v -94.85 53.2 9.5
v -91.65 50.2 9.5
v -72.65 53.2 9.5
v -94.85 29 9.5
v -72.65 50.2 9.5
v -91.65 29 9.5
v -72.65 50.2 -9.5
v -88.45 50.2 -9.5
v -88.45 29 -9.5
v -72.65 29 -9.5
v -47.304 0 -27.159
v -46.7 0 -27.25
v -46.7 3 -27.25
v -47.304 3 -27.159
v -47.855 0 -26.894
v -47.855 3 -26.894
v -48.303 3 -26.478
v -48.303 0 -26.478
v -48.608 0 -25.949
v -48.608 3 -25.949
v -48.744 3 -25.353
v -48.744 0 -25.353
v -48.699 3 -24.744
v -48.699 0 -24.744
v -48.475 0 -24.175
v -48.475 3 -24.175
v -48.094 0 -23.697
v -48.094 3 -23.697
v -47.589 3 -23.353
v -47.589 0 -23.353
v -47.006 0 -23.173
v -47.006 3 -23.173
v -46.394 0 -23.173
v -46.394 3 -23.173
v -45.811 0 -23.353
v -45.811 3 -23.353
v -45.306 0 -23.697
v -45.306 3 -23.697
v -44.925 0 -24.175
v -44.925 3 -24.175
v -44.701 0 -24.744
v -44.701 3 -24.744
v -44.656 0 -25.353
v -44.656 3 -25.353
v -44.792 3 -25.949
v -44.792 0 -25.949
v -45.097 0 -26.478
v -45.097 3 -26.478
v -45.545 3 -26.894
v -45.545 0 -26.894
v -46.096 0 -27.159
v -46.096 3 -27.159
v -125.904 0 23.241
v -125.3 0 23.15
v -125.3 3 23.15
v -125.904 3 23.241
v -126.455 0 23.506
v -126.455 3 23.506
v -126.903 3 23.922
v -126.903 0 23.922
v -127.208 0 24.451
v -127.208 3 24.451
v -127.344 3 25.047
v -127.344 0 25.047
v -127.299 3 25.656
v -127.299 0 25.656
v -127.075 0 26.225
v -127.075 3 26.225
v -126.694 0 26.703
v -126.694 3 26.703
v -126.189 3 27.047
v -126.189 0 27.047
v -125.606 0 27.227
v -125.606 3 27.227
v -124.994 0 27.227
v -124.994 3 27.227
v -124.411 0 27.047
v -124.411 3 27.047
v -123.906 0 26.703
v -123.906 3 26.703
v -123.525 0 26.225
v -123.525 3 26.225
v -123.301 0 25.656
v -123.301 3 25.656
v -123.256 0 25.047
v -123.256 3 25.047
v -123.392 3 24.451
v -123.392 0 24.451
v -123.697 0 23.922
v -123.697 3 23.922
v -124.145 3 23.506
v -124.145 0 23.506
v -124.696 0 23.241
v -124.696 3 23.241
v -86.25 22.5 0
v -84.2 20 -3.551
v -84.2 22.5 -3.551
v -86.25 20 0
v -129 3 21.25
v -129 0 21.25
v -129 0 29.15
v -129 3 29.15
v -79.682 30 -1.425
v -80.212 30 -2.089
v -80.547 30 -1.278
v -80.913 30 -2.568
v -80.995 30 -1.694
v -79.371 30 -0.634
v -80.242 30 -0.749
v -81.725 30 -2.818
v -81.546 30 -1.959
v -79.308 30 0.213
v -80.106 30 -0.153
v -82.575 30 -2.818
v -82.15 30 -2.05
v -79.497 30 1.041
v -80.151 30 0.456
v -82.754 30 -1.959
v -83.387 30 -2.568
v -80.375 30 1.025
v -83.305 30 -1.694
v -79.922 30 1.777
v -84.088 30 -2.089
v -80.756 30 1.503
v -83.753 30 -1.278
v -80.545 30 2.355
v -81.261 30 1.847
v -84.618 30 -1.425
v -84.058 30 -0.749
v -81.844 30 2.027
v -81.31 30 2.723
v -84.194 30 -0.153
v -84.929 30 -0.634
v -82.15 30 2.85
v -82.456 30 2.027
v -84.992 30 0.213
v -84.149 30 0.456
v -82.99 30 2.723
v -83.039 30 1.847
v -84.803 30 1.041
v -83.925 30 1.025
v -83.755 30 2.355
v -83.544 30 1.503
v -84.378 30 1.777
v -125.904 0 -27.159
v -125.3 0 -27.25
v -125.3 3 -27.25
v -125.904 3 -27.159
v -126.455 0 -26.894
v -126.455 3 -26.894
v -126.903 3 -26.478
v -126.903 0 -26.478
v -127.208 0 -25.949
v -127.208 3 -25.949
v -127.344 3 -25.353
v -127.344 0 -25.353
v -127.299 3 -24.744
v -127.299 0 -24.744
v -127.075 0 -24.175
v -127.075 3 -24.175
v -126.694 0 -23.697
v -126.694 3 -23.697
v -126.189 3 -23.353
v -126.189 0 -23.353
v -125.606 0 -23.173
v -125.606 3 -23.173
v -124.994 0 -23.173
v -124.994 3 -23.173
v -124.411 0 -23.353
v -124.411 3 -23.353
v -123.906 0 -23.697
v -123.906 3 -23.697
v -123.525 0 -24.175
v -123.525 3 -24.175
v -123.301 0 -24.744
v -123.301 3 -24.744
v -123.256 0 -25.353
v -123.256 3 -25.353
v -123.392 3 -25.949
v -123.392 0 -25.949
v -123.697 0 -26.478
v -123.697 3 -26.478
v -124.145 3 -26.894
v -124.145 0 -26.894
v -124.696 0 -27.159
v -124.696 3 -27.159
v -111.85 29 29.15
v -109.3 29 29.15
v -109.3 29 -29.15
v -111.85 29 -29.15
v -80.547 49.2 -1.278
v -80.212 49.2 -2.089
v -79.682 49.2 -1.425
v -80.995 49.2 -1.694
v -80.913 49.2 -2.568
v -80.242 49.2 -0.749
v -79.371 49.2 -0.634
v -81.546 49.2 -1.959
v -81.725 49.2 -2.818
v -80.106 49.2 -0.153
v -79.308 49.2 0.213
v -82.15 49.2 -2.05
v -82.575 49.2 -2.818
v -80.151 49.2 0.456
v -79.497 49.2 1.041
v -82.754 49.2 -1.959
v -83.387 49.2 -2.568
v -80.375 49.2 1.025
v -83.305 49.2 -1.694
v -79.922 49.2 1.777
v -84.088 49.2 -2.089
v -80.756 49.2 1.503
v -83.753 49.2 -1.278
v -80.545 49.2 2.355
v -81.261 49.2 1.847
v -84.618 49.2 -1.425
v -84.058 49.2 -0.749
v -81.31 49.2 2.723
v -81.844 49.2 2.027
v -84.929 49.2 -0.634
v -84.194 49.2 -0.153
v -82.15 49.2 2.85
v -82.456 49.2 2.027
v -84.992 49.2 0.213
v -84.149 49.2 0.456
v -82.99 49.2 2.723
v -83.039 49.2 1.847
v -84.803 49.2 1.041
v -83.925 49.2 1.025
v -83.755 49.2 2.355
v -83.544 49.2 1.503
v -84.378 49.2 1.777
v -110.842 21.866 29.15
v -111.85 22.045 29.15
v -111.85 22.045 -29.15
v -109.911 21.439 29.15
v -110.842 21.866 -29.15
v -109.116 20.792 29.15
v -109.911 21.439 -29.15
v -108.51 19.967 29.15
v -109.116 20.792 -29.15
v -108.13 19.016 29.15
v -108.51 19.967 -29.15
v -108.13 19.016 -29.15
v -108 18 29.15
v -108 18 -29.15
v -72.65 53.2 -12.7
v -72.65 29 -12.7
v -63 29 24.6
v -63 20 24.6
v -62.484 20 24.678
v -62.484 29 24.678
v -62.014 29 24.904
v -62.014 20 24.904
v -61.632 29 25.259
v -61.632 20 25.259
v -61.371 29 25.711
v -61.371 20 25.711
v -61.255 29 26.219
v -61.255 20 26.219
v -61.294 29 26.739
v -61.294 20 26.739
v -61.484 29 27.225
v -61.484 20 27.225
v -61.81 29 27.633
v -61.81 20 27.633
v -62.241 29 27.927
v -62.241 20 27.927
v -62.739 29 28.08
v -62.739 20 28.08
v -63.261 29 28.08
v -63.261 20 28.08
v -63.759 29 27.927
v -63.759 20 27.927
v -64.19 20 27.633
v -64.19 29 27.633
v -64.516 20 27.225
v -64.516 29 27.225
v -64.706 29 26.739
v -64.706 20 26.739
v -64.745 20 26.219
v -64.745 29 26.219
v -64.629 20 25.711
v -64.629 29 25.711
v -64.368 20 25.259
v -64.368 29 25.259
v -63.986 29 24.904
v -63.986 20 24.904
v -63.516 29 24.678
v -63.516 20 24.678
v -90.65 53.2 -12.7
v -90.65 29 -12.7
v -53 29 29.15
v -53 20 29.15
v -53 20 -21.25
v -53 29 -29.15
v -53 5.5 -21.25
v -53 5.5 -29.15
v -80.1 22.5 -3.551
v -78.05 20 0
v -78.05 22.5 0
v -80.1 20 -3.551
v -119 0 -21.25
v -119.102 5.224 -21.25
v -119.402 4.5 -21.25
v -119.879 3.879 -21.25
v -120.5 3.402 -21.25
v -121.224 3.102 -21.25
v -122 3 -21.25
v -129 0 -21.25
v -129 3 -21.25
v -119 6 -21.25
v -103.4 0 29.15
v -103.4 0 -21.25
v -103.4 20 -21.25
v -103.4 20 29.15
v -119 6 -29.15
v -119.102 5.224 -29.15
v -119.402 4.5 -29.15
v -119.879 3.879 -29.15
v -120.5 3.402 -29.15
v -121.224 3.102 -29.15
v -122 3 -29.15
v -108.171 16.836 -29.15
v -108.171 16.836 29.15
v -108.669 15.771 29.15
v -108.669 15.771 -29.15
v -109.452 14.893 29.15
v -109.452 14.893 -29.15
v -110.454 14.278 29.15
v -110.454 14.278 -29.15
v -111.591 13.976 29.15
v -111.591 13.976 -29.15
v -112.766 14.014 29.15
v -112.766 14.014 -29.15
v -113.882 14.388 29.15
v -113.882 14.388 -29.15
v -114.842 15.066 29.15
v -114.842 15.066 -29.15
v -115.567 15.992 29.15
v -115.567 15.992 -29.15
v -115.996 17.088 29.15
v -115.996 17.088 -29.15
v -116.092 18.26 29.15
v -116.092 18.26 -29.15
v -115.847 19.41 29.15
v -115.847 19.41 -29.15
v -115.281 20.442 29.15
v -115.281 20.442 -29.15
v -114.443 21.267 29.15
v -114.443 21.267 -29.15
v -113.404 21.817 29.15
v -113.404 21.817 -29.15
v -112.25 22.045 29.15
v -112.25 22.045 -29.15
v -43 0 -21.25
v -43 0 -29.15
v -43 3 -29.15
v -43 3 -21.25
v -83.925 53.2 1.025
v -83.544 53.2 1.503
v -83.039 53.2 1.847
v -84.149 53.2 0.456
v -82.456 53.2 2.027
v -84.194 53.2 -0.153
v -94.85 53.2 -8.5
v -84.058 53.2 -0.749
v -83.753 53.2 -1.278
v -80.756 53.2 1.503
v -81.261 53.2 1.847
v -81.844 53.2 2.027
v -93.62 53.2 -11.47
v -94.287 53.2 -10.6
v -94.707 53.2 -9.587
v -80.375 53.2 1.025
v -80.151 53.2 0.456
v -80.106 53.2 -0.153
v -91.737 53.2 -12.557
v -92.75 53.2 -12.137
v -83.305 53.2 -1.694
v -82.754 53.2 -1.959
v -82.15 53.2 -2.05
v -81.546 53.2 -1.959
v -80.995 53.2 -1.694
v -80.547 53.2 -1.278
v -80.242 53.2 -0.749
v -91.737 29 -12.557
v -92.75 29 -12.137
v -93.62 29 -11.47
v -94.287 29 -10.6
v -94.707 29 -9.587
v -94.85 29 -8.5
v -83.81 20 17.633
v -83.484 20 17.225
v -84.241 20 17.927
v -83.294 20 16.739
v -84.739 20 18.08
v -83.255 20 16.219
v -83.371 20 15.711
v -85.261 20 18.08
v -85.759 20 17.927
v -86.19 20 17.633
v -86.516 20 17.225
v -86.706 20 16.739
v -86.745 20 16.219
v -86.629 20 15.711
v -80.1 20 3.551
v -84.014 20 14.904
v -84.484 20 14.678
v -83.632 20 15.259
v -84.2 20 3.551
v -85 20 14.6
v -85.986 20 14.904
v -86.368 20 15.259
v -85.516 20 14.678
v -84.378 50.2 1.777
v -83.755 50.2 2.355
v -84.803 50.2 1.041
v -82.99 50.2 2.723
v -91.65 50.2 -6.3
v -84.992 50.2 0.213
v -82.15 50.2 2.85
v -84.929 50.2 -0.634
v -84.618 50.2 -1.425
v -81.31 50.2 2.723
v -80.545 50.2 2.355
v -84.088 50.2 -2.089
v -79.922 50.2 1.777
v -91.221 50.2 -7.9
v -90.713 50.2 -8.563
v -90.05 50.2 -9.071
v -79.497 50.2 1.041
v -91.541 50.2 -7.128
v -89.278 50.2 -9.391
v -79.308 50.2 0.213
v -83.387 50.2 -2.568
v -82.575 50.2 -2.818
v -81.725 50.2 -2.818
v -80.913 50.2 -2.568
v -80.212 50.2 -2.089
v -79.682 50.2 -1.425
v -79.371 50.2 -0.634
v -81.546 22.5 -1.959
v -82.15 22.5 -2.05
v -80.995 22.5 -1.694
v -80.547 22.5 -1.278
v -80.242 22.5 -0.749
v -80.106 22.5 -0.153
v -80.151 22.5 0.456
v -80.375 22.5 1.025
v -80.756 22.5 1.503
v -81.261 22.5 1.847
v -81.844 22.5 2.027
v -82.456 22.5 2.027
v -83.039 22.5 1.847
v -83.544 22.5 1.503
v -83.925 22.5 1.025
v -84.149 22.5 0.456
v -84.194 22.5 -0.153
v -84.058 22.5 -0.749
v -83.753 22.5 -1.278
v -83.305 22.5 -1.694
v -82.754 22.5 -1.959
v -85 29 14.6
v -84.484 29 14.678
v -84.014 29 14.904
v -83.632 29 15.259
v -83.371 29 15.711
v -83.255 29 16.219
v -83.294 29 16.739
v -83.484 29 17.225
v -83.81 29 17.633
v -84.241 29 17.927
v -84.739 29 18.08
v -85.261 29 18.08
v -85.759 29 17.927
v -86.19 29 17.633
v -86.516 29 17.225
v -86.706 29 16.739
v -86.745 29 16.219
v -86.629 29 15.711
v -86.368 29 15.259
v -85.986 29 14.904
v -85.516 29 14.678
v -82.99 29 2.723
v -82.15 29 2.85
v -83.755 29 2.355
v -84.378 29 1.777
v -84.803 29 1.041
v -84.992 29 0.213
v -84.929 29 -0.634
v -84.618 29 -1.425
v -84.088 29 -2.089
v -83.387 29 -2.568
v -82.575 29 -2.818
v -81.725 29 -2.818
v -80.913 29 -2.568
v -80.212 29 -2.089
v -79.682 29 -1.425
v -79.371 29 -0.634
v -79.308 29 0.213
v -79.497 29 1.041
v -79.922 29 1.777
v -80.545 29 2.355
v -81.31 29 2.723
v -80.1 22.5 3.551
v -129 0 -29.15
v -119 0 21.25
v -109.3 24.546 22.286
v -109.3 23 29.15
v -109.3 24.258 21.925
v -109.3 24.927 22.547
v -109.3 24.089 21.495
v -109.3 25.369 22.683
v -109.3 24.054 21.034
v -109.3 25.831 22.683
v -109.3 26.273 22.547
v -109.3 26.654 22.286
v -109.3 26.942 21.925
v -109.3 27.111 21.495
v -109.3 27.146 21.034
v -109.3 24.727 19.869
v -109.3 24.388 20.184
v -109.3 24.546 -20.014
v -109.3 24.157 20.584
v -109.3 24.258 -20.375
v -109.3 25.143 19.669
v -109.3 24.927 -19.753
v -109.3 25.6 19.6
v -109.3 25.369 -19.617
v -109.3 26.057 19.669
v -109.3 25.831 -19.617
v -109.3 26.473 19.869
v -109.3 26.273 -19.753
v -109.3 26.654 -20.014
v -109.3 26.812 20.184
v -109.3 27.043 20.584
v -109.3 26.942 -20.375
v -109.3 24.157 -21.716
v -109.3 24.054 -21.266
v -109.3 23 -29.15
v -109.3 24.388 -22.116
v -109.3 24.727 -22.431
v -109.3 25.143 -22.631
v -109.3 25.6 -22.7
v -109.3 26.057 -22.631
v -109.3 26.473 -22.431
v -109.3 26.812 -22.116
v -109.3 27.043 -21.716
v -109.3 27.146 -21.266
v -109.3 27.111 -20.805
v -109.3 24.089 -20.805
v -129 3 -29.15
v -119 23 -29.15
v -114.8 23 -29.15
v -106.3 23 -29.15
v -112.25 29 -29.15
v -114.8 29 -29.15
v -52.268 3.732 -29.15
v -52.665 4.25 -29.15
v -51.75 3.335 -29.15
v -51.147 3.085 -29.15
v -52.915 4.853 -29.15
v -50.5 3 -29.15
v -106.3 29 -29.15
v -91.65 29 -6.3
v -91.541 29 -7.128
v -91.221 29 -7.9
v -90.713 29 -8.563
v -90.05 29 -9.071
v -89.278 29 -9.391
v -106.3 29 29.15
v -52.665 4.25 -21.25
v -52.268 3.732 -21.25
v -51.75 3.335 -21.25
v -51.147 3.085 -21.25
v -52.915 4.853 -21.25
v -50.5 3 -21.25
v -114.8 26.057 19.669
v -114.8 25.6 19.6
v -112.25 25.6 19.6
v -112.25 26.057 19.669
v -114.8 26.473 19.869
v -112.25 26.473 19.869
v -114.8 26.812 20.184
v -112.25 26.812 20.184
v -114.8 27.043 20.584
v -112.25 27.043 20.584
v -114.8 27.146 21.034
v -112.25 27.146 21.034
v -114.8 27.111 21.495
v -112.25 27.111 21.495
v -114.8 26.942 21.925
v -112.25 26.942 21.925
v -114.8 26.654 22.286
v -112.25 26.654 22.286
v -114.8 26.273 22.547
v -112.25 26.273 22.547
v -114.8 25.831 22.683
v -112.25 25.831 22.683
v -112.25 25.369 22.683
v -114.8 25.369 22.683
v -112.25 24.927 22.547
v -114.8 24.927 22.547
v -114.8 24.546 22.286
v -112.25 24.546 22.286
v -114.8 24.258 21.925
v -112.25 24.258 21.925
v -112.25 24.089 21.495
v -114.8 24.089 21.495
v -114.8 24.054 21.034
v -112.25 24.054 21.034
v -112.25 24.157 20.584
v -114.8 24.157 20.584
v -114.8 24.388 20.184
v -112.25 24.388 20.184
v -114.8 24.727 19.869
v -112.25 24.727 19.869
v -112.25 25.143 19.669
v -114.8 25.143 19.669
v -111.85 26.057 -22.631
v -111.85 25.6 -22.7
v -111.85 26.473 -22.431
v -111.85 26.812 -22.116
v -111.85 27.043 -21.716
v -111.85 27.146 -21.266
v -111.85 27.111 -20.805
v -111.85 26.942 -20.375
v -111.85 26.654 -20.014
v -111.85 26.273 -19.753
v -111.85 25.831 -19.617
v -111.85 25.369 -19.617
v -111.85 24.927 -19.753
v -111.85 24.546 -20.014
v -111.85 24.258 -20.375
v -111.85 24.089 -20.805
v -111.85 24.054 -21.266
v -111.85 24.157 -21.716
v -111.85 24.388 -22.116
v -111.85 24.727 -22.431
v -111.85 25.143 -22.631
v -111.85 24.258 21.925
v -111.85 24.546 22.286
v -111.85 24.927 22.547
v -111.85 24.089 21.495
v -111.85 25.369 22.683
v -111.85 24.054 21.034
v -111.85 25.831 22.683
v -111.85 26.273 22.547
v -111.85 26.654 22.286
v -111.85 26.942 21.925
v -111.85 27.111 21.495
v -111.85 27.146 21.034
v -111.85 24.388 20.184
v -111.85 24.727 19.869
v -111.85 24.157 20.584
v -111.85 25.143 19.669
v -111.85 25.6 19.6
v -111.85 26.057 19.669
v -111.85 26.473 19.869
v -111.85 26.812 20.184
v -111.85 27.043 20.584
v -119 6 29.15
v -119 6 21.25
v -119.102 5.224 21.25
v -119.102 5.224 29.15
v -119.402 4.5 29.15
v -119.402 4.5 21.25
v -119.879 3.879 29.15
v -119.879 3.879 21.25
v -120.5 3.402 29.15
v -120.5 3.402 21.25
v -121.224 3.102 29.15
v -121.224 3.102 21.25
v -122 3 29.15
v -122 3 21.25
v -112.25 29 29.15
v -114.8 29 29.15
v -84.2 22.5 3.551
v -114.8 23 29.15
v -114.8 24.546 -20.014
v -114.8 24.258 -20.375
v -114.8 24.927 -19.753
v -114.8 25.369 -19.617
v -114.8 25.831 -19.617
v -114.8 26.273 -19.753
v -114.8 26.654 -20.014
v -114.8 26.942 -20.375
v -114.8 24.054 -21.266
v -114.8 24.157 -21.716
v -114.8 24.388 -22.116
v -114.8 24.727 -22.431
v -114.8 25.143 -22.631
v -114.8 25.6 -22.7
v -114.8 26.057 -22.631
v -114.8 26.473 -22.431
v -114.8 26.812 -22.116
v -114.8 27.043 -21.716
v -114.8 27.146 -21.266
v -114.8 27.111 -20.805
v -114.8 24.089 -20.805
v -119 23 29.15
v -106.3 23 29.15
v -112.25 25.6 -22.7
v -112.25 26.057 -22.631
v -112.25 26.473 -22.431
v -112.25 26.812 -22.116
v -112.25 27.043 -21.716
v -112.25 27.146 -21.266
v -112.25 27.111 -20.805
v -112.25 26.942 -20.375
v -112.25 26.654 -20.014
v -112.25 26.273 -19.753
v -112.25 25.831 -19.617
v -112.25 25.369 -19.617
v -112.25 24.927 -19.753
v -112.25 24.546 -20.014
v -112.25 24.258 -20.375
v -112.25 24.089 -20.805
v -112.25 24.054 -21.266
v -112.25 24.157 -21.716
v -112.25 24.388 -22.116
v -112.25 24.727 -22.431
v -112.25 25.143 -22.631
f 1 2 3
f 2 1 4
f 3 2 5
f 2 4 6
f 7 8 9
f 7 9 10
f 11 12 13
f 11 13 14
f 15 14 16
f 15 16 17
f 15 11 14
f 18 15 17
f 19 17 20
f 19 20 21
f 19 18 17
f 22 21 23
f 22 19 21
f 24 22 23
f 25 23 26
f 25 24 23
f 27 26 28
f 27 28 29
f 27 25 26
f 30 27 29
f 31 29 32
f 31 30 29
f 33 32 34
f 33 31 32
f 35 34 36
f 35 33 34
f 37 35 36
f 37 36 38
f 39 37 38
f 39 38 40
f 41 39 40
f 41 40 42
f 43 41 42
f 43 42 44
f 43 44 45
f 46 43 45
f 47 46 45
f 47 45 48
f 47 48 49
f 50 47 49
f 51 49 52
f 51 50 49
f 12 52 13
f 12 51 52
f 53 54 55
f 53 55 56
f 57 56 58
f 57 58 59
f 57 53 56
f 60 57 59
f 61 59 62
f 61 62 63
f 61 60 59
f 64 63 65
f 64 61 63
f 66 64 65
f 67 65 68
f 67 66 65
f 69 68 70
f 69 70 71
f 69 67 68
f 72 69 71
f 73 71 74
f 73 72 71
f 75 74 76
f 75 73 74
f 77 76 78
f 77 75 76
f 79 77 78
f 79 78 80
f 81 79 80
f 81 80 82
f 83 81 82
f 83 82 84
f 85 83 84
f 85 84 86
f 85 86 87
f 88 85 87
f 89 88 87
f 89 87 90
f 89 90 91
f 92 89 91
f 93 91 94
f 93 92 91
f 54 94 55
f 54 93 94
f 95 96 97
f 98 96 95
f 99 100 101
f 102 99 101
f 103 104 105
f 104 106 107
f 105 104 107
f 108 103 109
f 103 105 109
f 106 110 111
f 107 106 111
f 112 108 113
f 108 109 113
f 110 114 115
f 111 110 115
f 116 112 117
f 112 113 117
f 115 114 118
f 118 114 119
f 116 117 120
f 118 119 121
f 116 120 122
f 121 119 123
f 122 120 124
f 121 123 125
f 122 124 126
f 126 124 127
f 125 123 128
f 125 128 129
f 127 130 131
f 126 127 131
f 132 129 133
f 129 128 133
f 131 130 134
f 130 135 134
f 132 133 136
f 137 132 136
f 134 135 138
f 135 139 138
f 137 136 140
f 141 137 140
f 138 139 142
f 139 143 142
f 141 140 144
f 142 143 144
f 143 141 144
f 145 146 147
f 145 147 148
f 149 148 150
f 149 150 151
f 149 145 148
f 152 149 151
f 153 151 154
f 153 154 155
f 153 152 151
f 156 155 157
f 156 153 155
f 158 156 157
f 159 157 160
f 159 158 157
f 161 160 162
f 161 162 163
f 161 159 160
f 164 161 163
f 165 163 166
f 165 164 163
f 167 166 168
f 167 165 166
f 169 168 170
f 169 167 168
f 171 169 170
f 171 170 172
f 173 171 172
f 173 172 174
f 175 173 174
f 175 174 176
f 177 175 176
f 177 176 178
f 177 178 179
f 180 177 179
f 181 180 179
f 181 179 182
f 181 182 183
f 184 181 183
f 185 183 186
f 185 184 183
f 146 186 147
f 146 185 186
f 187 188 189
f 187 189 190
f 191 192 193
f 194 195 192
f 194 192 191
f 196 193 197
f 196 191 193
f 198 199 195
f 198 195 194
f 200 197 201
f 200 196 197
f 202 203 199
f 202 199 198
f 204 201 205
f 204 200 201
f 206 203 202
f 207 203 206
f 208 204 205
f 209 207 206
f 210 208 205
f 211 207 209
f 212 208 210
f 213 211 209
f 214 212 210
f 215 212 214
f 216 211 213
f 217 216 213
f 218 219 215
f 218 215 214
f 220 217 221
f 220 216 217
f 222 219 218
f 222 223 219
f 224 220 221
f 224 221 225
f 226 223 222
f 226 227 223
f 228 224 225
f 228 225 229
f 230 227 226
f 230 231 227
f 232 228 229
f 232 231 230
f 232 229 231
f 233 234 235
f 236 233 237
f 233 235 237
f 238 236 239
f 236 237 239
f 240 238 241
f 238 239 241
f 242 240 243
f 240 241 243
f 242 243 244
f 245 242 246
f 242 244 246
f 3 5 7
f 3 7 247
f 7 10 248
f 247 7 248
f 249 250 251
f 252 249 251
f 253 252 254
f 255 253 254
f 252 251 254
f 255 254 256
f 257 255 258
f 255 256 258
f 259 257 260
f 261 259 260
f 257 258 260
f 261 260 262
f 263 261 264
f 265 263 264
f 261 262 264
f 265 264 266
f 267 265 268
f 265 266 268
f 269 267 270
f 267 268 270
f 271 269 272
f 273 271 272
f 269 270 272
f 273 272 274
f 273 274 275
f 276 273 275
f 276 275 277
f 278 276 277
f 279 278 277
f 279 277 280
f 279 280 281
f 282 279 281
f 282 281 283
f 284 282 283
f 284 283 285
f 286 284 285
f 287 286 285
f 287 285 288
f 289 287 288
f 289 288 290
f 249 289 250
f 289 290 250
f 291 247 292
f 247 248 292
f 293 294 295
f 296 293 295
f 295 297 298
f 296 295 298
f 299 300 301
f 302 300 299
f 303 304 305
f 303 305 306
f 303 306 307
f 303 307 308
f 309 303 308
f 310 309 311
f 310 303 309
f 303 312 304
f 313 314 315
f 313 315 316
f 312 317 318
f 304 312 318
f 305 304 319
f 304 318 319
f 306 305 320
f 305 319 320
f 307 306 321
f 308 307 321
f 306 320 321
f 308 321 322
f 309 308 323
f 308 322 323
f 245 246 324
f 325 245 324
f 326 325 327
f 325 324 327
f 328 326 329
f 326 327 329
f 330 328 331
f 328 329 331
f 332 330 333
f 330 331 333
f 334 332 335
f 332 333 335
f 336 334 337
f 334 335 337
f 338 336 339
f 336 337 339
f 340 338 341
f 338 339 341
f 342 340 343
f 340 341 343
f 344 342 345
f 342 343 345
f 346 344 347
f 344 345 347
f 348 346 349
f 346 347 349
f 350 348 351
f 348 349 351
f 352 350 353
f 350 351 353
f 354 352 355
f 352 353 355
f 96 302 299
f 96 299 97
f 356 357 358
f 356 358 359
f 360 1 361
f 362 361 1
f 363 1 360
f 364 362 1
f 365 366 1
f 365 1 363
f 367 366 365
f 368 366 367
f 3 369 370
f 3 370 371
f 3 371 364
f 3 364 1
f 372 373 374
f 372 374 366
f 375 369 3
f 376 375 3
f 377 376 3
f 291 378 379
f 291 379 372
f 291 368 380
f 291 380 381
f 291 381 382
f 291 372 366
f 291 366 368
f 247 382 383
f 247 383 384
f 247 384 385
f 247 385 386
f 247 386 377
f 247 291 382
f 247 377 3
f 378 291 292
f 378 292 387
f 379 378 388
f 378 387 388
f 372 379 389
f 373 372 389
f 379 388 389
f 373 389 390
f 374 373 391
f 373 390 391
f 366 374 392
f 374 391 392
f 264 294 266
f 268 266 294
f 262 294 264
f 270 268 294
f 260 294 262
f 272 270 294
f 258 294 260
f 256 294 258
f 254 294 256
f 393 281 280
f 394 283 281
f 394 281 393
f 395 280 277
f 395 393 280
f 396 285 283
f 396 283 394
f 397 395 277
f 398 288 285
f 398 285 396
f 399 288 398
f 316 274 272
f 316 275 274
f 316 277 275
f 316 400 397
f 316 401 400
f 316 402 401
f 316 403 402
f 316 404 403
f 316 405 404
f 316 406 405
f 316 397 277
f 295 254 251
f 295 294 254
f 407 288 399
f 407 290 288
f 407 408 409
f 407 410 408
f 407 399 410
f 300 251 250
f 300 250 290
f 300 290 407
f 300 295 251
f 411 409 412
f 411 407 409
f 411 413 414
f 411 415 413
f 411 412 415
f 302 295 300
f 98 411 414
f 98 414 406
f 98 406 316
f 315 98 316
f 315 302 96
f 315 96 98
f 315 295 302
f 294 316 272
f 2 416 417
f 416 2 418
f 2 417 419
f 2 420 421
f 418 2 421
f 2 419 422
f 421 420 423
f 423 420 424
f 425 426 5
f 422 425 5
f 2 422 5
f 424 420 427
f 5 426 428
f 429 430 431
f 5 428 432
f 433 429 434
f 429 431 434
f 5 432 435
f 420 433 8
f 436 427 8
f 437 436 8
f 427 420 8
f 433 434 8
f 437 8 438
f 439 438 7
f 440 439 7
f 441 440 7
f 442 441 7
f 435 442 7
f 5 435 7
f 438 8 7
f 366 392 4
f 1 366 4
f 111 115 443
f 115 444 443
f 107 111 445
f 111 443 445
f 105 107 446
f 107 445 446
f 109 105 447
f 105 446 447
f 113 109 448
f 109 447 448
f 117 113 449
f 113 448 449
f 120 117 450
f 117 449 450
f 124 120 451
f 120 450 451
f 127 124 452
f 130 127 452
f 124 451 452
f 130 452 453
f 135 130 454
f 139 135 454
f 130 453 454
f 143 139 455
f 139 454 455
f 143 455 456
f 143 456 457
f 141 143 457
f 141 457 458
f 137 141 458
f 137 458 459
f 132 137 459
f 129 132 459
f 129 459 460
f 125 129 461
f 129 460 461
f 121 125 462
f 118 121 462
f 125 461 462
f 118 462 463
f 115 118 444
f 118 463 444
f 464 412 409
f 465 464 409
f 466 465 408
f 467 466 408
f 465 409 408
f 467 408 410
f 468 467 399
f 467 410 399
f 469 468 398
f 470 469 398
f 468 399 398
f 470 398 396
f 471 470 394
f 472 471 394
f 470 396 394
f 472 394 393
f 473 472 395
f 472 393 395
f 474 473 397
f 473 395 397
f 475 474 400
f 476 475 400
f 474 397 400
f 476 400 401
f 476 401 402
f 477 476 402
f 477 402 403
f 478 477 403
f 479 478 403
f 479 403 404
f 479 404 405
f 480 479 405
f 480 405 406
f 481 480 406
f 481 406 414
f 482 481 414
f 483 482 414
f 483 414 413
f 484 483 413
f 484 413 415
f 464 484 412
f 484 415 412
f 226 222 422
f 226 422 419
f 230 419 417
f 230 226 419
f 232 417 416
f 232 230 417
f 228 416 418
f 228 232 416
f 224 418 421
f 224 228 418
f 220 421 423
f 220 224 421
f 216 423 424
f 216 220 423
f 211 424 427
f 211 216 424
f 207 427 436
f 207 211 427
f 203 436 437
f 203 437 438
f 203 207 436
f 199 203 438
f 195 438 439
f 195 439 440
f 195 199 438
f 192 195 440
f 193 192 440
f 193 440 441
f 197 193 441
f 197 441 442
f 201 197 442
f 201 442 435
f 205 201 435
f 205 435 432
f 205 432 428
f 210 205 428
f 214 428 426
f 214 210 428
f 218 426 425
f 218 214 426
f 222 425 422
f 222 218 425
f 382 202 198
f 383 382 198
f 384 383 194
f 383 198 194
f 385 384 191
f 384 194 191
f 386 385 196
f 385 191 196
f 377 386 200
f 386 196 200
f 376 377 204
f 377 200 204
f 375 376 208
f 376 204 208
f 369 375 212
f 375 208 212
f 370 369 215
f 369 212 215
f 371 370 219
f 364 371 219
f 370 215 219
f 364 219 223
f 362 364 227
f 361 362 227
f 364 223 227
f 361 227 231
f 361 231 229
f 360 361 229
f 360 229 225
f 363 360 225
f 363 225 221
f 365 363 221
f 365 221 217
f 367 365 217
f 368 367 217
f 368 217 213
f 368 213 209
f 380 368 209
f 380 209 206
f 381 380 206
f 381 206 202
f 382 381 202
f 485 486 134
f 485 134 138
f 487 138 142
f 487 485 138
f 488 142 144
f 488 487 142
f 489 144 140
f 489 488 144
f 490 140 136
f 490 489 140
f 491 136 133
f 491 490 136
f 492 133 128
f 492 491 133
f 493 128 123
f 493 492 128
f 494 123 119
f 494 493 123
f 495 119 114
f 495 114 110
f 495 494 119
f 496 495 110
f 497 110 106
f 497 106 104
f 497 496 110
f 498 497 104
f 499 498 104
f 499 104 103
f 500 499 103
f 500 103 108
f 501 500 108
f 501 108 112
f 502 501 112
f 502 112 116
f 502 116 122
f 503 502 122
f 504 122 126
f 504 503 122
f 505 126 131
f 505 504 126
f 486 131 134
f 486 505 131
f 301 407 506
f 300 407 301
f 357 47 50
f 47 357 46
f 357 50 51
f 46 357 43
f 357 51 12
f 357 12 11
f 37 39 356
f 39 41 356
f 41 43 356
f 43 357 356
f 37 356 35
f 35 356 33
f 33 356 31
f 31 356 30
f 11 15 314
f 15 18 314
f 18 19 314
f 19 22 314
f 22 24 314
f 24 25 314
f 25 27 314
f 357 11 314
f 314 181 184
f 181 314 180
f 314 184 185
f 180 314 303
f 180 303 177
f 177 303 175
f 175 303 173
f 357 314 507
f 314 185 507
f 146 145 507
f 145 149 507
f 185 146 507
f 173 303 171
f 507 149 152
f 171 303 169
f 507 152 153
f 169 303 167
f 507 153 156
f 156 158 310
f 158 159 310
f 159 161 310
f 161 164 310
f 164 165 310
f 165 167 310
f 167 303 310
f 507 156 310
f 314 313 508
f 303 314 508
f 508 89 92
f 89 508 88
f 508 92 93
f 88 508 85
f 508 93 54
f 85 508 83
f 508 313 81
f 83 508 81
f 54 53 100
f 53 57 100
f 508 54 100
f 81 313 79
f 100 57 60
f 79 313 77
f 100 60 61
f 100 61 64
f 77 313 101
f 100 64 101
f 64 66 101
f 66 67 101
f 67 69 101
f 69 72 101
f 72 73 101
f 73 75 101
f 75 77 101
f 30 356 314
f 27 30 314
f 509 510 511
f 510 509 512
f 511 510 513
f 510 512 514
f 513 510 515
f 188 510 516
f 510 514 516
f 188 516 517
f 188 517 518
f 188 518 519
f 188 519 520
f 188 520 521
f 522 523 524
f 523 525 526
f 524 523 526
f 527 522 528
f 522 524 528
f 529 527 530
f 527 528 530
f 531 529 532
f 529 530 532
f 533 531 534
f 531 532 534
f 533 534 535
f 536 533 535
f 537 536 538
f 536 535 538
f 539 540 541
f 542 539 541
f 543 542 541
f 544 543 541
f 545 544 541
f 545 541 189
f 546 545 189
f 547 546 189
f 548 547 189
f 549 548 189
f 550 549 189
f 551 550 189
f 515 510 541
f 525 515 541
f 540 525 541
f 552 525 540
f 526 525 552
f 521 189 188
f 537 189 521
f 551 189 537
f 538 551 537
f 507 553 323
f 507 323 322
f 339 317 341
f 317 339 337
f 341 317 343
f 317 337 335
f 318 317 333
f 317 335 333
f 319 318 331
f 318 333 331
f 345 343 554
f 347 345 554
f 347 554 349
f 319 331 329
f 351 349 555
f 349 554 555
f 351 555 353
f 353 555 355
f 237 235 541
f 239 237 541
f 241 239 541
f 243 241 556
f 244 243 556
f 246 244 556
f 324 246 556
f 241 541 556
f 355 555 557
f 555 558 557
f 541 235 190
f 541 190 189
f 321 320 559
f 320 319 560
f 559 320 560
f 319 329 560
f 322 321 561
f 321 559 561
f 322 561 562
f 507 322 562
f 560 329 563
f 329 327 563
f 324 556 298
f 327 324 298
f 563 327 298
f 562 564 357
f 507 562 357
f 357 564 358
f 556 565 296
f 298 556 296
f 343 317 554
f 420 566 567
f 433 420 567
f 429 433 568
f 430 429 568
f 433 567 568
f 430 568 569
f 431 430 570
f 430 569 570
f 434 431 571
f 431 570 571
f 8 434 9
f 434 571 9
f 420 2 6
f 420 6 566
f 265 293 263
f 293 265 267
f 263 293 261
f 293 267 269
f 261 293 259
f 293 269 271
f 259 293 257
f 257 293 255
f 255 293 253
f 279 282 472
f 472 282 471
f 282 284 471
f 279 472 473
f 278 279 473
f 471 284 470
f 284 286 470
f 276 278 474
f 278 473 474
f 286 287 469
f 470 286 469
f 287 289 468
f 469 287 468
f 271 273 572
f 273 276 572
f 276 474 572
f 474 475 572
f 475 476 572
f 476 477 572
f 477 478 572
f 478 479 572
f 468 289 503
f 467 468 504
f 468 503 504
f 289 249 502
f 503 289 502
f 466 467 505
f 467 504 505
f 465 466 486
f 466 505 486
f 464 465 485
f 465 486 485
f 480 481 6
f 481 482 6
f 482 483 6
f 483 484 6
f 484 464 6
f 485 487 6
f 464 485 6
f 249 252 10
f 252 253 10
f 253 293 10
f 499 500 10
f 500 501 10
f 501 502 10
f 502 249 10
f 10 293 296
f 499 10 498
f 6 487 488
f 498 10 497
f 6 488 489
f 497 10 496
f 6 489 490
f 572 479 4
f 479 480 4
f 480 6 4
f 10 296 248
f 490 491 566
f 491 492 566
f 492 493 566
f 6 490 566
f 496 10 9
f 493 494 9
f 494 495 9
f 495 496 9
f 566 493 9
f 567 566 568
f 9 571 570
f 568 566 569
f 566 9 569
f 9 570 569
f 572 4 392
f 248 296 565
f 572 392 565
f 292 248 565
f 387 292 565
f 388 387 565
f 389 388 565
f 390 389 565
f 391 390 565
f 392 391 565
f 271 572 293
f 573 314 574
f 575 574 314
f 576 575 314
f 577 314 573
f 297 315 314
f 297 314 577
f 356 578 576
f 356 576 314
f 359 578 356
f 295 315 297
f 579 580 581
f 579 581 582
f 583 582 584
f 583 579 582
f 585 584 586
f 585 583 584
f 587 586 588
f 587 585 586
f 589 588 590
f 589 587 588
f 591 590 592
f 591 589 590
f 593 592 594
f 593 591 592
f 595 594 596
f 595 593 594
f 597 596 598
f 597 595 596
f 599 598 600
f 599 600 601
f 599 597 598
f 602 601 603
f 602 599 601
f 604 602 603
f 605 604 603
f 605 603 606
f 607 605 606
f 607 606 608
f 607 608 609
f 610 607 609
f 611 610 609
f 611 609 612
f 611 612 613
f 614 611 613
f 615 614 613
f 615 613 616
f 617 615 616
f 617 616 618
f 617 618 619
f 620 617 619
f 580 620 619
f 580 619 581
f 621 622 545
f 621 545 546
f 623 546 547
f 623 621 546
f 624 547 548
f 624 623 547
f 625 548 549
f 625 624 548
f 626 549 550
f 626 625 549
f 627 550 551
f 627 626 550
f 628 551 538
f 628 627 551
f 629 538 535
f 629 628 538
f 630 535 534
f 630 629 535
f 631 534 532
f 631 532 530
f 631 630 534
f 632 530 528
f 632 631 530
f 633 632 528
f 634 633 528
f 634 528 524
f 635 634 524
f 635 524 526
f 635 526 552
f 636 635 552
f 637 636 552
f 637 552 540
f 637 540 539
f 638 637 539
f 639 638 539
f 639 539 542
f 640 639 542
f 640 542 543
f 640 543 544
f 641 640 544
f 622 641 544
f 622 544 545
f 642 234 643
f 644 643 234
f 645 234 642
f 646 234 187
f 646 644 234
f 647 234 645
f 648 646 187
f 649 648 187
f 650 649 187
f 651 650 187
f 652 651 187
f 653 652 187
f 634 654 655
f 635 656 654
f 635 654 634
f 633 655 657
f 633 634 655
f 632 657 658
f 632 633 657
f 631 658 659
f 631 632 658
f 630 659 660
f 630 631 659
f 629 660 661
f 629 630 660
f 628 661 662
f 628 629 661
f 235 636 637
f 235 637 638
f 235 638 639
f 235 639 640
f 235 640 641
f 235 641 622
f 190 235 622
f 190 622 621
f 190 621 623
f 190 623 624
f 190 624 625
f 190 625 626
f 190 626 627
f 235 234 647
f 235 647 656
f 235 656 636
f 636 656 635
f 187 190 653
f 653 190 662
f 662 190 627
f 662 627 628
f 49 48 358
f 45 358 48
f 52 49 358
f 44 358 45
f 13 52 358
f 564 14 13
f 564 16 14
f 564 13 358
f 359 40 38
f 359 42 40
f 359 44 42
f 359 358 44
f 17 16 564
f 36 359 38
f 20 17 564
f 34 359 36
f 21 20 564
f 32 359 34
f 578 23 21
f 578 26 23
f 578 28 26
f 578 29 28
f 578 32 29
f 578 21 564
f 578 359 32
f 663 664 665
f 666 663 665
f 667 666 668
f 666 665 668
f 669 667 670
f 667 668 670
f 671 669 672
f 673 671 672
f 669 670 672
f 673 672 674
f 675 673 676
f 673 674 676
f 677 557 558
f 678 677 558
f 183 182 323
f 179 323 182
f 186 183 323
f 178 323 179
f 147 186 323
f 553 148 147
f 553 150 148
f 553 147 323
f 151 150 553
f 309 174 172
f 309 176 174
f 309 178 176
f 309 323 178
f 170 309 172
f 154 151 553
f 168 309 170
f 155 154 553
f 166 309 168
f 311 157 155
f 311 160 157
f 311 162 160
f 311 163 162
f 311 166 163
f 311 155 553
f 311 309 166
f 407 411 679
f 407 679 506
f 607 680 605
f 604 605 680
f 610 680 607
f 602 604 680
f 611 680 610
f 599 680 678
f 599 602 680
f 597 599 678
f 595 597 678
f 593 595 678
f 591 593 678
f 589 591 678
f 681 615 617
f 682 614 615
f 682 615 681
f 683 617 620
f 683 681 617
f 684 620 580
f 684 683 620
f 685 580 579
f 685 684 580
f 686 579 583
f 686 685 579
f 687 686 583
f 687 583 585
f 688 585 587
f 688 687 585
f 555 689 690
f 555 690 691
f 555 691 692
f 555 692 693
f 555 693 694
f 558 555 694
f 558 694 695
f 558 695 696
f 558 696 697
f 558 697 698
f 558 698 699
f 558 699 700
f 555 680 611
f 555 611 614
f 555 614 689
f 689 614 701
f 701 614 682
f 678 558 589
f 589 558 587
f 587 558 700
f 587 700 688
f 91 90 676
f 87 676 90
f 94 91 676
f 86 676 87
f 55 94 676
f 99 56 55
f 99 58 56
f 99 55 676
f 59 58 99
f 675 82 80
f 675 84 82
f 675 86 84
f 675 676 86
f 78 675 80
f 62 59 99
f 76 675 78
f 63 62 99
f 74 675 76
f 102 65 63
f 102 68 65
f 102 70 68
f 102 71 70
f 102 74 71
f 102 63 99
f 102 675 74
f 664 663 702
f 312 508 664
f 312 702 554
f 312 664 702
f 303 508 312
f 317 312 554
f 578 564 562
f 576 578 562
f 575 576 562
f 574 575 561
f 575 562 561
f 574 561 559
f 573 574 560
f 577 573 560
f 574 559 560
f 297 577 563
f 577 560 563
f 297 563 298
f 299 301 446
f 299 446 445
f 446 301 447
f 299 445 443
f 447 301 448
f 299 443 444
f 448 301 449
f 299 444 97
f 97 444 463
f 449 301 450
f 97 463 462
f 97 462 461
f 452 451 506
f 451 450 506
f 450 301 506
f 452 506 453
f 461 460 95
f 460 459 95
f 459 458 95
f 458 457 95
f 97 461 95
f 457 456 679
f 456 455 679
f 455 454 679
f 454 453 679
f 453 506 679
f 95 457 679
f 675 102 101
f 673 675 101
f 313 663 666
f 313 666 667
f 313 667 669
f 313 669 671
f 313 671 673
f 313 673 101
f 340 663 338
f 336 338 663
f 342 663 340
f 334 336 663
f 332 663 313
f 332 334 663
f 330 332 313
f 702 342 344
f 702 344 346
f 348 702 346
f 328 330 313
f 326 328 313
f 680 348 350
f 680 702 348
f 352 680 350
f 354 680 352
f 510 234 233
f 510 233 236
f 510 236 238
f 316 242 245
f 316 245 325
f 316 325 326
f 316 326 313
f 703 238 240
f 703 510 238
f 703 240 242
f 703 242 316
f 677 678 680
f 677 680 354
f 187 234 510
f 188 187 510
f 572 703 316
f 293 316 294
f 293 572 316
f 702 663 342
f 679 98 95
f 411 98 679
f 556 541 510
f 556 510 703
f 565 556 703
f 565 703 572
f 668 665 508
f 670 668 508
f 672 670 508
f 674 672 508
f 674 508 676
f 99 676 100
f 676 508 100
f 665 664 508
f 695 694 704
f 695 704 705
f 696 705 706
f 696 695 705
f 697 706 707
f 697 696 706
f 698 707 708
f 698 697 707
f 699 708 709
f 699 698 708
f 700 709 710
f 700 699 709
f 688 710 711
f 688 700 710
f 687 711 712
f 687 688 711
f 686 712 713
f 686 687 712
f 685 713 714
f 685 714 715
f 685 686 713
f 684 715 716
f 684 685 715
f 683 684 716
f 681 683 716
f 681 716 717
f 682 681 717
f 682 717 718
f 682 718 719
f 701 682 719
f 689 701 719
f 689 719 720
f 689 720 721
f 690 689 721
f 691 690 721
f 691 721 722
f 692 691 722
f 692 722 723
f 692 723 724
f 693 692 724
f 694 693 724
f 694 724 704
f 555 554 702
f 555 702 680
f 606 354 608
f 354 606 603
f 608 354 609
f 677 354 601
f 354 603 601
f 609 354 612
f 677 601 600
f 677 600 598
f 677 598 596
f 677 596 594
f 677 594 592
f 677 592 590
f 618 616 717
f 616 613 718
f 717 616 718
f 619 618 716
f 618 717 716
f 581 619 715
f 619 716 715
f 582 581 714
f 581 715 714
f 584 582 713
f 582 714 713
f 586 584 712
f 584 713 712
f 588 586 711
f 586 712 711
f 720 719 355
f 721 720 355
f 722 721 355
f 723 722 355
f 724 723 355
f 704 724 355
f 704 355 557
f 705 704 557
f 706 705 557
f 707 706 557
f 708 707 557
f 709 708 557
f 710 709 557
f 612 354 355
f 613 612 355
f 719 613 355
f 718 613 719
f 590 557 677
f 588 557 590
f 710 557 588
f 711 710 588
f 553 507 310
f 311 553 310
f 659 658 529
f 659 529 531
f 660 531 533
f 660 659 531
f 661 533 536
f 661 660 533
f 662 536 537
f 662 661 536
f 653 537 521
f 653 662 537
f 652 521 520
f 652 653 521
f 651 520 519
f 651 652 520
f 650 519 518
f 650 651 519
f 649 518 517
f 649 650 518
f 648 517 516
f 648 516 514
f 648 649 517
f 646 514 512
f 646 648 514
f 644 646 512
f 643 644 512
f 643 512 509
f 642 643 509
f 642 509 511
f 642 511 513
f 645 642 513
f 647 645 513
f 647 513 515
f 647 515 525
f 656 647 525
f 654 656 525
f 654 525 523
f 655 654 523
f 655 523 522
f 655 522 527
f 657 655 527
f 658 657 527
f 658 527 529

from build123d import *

# Parameters (mm, degrees)
SKETCH1_W           = 66
SKETCH1_H           = 58.3
SKETCH1_R           = 2.05
BOSS_EXTRUDE1_DEPTH = 29
CUT_EXTRUDE1_START  = -29
CUT_EXTRUDE1_DEPTH  = 20
SKETCH6_W           = 10
SKETCH6_H           = 7.9
SKETCH6_R           = 2.05
BOSS_EXTRUDE2_DEPTH = 3
BOSS_EXTRUDE4_DEPTH = 7.9
BOSS_EXTRUDE5_START = -50.4
BOSS_EXTRUDE5_DEPTH = 7.9
CUT_EXTRUDE4_START  = -58.3
SKETCH8_R           = 4.05
CUT_EXTRUDE4_DEPTH  = 58.3
CUT_EXTRUDE5_REACH  = 80.031
SKETCH10_W          = 3
SKETCH10_H          = 6
SKETCH10_W_2        = 4.2
SKETCH10_W_3        = 0.4
SKETCH10_H_2        = 7.617508416
CUT_EXTRUDE6_REACH  = 84.74
SKETCH11_R          = 1.55
CUT_EXTRUDE7_DEPTH  = 2.5
BOSS_EXTRUDE6_DEPTH = 21.2
SKETCH14_R          = 2.05
BOSS_EXTRUDE7_DEPTH = 3
BOSS_EXTRUDE8_START = -4
SKETCH15_R          = 2.85
SKETCH15_R_2        = 2.05
BOSS_EXTRUDE8_DEPTH = 1
BOSS_EXTRUDE9_START = -24.2
SKETCH15_2_R        = 2.85
SKETCH15_2_R_2      = 2.05
BOSS_EXTRUDE9_DEPTH = 1
SKETCH16_W          = 60.451877866
SKETCH16_H          = 7.9
CUT_EXTRUDE8_DEPTH  = 20
SKETCH19_R          = 1.75
CUT_EXTRUDE9_DEPTH  = 9


with BuildPart() as part:
    # Sketch1 → Boss-Extrude1 (new body)
    with BuildSketch(Plane(origin=(0, 0, 0), x_dir=(1, 0, 0), z_dir=(0, 1, 0))):
        Rectangle(SKETCH1_W, SKETCH1_H)
        with Locations(Location((-3.85, 0, 0), (0, 0, 90))):
            Circle(SKETCH1_R, mode=Mode.SUBTRACT)
    extrude(amount=BOSS_EXTRUDE1_DEPTH)

    # Sketch3 → Cut-Extrude1 (cut)
    with BuildSketch(Plane(origin=(0, 29, 0), x_dir=(1, 0, 0), z_dir=(0, 1, 0)).offset(CUT_EXTRUDE1_START)):
        Polygon((-33, 21.25), (-33, -21.25), (17.4, -21.25), (17.4, 21.25), (-25.1, 21.25), align=None)
    extrude(amount=CUT_EXTRUDE1_DEPTH, mode=Mode.SUBTRACT)

    # Sketch6 → Boss-Extrude2 (add)
    # profile 1 of 4: a face of its own
    with BuildSketch(Plane.XZ):
        with Locations((-38, 25.2)):
            Rectangle(SKETCH6_W, SKETCH6_H)
        with Locations(Location((-39.3, 25.2, 0), (0, 0, 270))):
            Circle(SKETCH6_R, mode=Mode.SUBTRACT)
    # profile 2 of 4: a face of its own
    with BuildSketch(Plane.XZ):
        with Locations((-38, -25.2)):
            Rectangle(SKETCH6_W, SKETCH6_H)
        with Locations(Location((-39.3, -25.2, 0), (0, 0, 270))):
            Circle(SKETCH6_R, mode=Mode.SUBTRACT)
    # profile 3 of 4: a face of its own
    with BuildSketch(Plane.XZ):
        with Locations((38, 25.2)):
            Rectangle(SKETCH6_W, SKETCH6_H)
        with Locations(Location((39.3, 25.2, 0), (0, 0, 270))):
            Circle(SKETCH6_R, mode=Mode.SUBTRACT)
    # profile 4 of 4: a face of its own
    with BuildSketch(Plane.XZ):
        with Locations((38, -25.2)):
            Rectangle(SKETCH6_W, SKETCH6_H)
        with Locations(Location((39.3, -25.2, 0), (0, 0, 270))):
            Circle(SKETCH6_R, mode=Mode.SUBTRACT)
    extrude(amount=-BOSS_EXTRUDE2_DEPTH)

    # Sketch7 → Boss-Extrude4 (add)
    with BuildSketch(Plane(origin=(0, 0, -29.15), x_dir=(-1, 0, 0), z_dir=(0, 0, -1))):
        with BuildLine():
            ThreePointArc((35.5, 3), (33.732233047, 3.732233047), (33, 5.5))
            Line((33, 5.5), (33, 3))
            Line((33, 3), (35.5, 3))
        make_face()
        with BuildLine():
            ThreePointArc((-33, 6), (-33.878679656, 3.878679656), (-36, 3))
            Line((-36, 3), (-33, 3))
            Line((-33, 3), (-33, 6))
        make_face()
    extrude(amount=-BOSS_EXTRUDE4_DEPTH)

    # Sketch7<5> → Boss-Extrude5 (add)
    with BuildSketch(Plane(origin=(0, 0, -29.15), x_dir=(-1, 0, 0), z_dir=(0, 0, -1)).offset(BOSS_EXTRUDE5_START)):
        with BuildLine():
            ThreePointArc((35.5, 3), (33.732233047, 3.732233047), (33, 5.5))
            Line((33, 5.5), (33, 3))
            Line((33, 3), (35.5, 3))
        make_face()
        with BuildLine():
            ThreePointArc((-33, 6), (-33.878679656, 3.878679656), (-36, 3))
            Line((-36, 3), (-33, 3))
            Line((-33, 3), (-33, 6))
        make_face()
    extrude(amount=-BOSS_EXTRUDE5_DEPTH)

    # Sketch8 → Cut-Extrude4 (cut)
    with BuildSketch(Plane.XY.offset(29.15).offset(CUT_EXTRUDE4_START)):
        with Locations(Location((26.05, 18, 0), (0, 0, 180))):
            Circle(SKETCH8_R)
    extrude(amount=CUT_EXTRUDE4_DEPTH, mode=Mode.SUBTRACT)

    # Sketch10 → Cut-Extrude5 (cut, up to next)
    with BuildSketch(Plane(origin=(0, 0, -29.15), x_dir=(-1, 0, 0), z_dir=(0, 0, -1)), mode=Mode.PRIVATE) as cut_extrude5_sk1:
        with Locations((-21.8, 26)):
            Rectangle(SKETCH10_W, SKETCH10_H)
    cut_extrude5_tool1 = extrude(cut_extrude5_sk1.sketch, amount=-CUT_EXTRUDE5_REACH, mode=Mode.PRIVATE) & part.part
    # Sketch10 → Cut-Extrude5 (cut, up to next)
    with BuildSketch(Plane(origin=(0, 0, -29.15), x_dir=(-1, 0, 0), z_dir=(0, 0, -1)), mode=Mode.PRIVATE) as cut_extrude5_sk2:
        with Locations((-30.9, 26)):
            Rectangle(SKETCH10_W_2, SKETCH10_H)
    cut_extrude5_tool2 = extrude(cut_extrude5_sk2.sketch, amount=-CUT_EXTRUDE5_REACH, mode=Mode.PRIVATE) & part.part
    # Sketch10 → Cut-Extrude5 (cut, up to next)
    with BuildSketch(Plane(origin=(0, 0, -29.15), x_dir=(-1, 0, 0), z_dir=(0, 0, -1)), mode=Mode.PRIVATE) as cut_extrude5_sk3:
        with Locations((-26.05, 25.191245792)):
            Rectangle(SKETCH10_W_3, SKETCH10_H_2)
    cut_extrude5_tool3 = extrude(cut_extrude5_sk3.sketch, amount=-CUT_EXTRUDE5_REACH, mode=Mode.PRIVATE) & part.part
    add(cut_extrude5_tool1.solids().sort_by_distance((21.8, 26, -29.15))[0], mode=Mode.SUBTRACT)
    add(cut_extrude5_tool2.solids().sort_by_distance((30.9, 26, -29.15))[0], mode=Mode.SUBTRACT)
    add(cut_extrude5_tool3.solids().sort_by_distance((26.05, 25.191246, -29.15))[0], mode=Mode.SUBTRACT)

    # Cut-Extrude6: up to this face of the body (flat: up to its plane)
    cut_extrude6_end = Plane(part.part.faces().sort_by_distance((23.3, 26, 0))[0])
    # Sketch11 → Cut-Extrude6 (cut, up to the picked face)
    with BuildSketch(Plane(origin=(28.8, 0, 0), x_dir=(0, 0, -1), z_dir=(1, 0, 0)), mode=Mode.PRIVATE) as cut_extrude6_sk1:
        with Locations((-21.15, 25.6)):
            Circle(SKETCH11_R)
    cut_extrude6_tool1 = split(extrude(cut_extrude6_sk1.sketch, amount=-CUT_EXTRUDE6_REACH, mode=Mode.PRIVATE), bisect_by=cut_extrude6_end, keep=Keep.BOTH, mode=Mode.PRIVATE)
    # Sketch11 → Cut-Extrude6 (cut, up to the picked face)
    with BuildSketch(Plane(origin=(28.8, 0, 0), x_dir=(0, 0, -1), z_dir=(1, 0, 0)), mode=Mode.PRIVATE) as cut_extrude6_sk2:
        with Locations((21.15, 25.6)):
            Circle(SKETCH11_R)
    cut_extrude6_tool2 = split(extrude(cut_extrude6_sk2.sketch, amount=-CUT_EXTRUDE6_REACH, mode=Mode.PRIVATE), bisect_by=cut_extrude6_end, keep=Keep.BOTH, mode=Mode.PRIVATE)
    add(cut_extrude6_tool1.solids().sort_by(Axis((28.8, 25.6, 21.15), (-1, 0, 0)))[0], mode=Mode.SUBTRACT)
    add(cut_extrude6_tool2.solids().sort_by(Axis((28.8, 25.6, -21.15), (-1, 0, 0)))[0], mode=Mode.SUBTRACT)

    # Sketch12 → Cut-Extrude7 (cut)
    with BuildSketch(Plane.XZ.offset(-20)):
        Polygon((-7.95, 0), (-5.9, -3.550704156), (-1.8, -3.550704156), (0.25, 0), (-1.8, 3.550704156), (-5.9, 3.550704156), align=None)
    extrude(amount=-CUT_EXTRUDE7_DEPTH, mode=Mode.SUBTRACT)

    # Sketch13 → Boss-Extrude6 (add)
    with BuildSketch(Plane(origin=(0, 29, 0), x_dir=(1, 0, 0), z_dir=(0, 1, 0))):
        with BuildLine():
            Line((-13.35, 9.5), (-13.35, 12.7))
            Line((-13.35, 12.7), (4.65, 12.7))
            ThreePointArc((4.65, 12.7), (7.619848481, 11.469848481), (8.85, 8.5))
            Line((8.85, 8.5), (8.85, -9.5))
            Line((8.85, -9.5), (5.65, -9.5))
            Line((5.65, -9.5), (5.65, 6.3))
            ThreePointArc((5.65, 6.3), (4.7127417, 8.5627417), (2.45, 9.5))
            Line((2.45, 9.5), (-13.35, 9.5))
        make_face()
    extrude(amount=BOSS_EXTRUDE6_DEPTH)

    # Sketch14 → Boss-Extrude7 (add)
    with BuildSketch(Plane(origin=(0, 50.2, 0), x_dir=(1, 0, 0), z_dir=(0, 1, 0))):
        with BuildLine():
            Line((-13.35, 12.7), (4.65, 12.7))
            ThreePointArc((4.65, 12.7), (7.619848481, 11.469848481), (8.85, 8.5))
            Line((8.85, 8.5), (8.85, -9.5))
            Line((8.85, -9.5), (-13.35, -9.5))
            Line((-13.35, -9.5), (-13.35, 12.7))
        make_face()
        with Locations(Location((-3.85, 0, 0), (0, 0, 90))):
            Circle(SKETCH14_R, mode=Mode.SUBTRACT)
    extrude(amount=BOSS_EXTRUDE7_DEPTH)

    # Sketch15 → Boss-Extrude8 (add)
    with BuildSketch(Plane(origin=(0, 53.2, 0), x_dir=(1, 0, 0), z_dir=(0, 1, 0)).offset(BOSS_EXTRUDE8_START)):
        with Locations(Location((-3.85, 0, 0), (0, 0, 270))):
            Circle(SKETCH15_R)
        with Locations(Location((-3.85, 0, 0), (0, 0, 90))):
            Circle(SKETCH15_R_2, mode=Mode.SUBTRACT)
    extrude(amount=BOSS_EXTRUDE8_DEPTH)

    # Sketch15<2> → Boss-Extrude9 (add)
    with BuildSketch(Plane(origin=(0, 53.2, 0), x_dir=(1, 0, 0), z_dir=(0, 1, 0)).offset(BOSS_EXTRUDE9_START)):
        with Locations(Location((-3.85, 0, 0), (0, 0, 270))):
            Circle(SKETCH15_2_R)
        with Locations(Location((-3.85, 0, 0), (0, 0, 90))):
            Circle(SKETCH15_2_R_2, mode=Mode.SUBTRACT)
    extrude(amount=BOSS_EXTRUDE9_DEPTH)


with BuildPart() as body_2:
    # Mirror2: mirrored copy
    add(part.part.mirror(Plane(origin=(-43, 3, -21.25), x_dir=(0, 0, 1), z_dir=(-1, 0, 0))))

    # Sketch16 → Cut-Extrude8 (cut)
    with BuildSketch(Plane.XZ):
        with Locations((-73.174061067, 25.2)):
            Rectangle(SKETCH16_W, SKETCH16_H)
    extrude(amount=-CUT_EXTRUDE8_DEPTH, mode=Mode.SUBTRACT)

    # Sketch19 → Cut-Extrude9 (cut)
    with BuildSketch(Plane.XZ.offset(-20)):
        with Locations(Location((-85, 16.35, 0), (0, 0, 270))):
            Circle(SKETCH19_R)
        with Locations(Location((-63, 26.35, 0), (0, 0, 270))):
            Circle(SKETCH19_R)
    extrude(amount=-CUT_EXTRUDE9_DEPTH, mode=Mode.SUBTRACT)


solid = body_2.part
